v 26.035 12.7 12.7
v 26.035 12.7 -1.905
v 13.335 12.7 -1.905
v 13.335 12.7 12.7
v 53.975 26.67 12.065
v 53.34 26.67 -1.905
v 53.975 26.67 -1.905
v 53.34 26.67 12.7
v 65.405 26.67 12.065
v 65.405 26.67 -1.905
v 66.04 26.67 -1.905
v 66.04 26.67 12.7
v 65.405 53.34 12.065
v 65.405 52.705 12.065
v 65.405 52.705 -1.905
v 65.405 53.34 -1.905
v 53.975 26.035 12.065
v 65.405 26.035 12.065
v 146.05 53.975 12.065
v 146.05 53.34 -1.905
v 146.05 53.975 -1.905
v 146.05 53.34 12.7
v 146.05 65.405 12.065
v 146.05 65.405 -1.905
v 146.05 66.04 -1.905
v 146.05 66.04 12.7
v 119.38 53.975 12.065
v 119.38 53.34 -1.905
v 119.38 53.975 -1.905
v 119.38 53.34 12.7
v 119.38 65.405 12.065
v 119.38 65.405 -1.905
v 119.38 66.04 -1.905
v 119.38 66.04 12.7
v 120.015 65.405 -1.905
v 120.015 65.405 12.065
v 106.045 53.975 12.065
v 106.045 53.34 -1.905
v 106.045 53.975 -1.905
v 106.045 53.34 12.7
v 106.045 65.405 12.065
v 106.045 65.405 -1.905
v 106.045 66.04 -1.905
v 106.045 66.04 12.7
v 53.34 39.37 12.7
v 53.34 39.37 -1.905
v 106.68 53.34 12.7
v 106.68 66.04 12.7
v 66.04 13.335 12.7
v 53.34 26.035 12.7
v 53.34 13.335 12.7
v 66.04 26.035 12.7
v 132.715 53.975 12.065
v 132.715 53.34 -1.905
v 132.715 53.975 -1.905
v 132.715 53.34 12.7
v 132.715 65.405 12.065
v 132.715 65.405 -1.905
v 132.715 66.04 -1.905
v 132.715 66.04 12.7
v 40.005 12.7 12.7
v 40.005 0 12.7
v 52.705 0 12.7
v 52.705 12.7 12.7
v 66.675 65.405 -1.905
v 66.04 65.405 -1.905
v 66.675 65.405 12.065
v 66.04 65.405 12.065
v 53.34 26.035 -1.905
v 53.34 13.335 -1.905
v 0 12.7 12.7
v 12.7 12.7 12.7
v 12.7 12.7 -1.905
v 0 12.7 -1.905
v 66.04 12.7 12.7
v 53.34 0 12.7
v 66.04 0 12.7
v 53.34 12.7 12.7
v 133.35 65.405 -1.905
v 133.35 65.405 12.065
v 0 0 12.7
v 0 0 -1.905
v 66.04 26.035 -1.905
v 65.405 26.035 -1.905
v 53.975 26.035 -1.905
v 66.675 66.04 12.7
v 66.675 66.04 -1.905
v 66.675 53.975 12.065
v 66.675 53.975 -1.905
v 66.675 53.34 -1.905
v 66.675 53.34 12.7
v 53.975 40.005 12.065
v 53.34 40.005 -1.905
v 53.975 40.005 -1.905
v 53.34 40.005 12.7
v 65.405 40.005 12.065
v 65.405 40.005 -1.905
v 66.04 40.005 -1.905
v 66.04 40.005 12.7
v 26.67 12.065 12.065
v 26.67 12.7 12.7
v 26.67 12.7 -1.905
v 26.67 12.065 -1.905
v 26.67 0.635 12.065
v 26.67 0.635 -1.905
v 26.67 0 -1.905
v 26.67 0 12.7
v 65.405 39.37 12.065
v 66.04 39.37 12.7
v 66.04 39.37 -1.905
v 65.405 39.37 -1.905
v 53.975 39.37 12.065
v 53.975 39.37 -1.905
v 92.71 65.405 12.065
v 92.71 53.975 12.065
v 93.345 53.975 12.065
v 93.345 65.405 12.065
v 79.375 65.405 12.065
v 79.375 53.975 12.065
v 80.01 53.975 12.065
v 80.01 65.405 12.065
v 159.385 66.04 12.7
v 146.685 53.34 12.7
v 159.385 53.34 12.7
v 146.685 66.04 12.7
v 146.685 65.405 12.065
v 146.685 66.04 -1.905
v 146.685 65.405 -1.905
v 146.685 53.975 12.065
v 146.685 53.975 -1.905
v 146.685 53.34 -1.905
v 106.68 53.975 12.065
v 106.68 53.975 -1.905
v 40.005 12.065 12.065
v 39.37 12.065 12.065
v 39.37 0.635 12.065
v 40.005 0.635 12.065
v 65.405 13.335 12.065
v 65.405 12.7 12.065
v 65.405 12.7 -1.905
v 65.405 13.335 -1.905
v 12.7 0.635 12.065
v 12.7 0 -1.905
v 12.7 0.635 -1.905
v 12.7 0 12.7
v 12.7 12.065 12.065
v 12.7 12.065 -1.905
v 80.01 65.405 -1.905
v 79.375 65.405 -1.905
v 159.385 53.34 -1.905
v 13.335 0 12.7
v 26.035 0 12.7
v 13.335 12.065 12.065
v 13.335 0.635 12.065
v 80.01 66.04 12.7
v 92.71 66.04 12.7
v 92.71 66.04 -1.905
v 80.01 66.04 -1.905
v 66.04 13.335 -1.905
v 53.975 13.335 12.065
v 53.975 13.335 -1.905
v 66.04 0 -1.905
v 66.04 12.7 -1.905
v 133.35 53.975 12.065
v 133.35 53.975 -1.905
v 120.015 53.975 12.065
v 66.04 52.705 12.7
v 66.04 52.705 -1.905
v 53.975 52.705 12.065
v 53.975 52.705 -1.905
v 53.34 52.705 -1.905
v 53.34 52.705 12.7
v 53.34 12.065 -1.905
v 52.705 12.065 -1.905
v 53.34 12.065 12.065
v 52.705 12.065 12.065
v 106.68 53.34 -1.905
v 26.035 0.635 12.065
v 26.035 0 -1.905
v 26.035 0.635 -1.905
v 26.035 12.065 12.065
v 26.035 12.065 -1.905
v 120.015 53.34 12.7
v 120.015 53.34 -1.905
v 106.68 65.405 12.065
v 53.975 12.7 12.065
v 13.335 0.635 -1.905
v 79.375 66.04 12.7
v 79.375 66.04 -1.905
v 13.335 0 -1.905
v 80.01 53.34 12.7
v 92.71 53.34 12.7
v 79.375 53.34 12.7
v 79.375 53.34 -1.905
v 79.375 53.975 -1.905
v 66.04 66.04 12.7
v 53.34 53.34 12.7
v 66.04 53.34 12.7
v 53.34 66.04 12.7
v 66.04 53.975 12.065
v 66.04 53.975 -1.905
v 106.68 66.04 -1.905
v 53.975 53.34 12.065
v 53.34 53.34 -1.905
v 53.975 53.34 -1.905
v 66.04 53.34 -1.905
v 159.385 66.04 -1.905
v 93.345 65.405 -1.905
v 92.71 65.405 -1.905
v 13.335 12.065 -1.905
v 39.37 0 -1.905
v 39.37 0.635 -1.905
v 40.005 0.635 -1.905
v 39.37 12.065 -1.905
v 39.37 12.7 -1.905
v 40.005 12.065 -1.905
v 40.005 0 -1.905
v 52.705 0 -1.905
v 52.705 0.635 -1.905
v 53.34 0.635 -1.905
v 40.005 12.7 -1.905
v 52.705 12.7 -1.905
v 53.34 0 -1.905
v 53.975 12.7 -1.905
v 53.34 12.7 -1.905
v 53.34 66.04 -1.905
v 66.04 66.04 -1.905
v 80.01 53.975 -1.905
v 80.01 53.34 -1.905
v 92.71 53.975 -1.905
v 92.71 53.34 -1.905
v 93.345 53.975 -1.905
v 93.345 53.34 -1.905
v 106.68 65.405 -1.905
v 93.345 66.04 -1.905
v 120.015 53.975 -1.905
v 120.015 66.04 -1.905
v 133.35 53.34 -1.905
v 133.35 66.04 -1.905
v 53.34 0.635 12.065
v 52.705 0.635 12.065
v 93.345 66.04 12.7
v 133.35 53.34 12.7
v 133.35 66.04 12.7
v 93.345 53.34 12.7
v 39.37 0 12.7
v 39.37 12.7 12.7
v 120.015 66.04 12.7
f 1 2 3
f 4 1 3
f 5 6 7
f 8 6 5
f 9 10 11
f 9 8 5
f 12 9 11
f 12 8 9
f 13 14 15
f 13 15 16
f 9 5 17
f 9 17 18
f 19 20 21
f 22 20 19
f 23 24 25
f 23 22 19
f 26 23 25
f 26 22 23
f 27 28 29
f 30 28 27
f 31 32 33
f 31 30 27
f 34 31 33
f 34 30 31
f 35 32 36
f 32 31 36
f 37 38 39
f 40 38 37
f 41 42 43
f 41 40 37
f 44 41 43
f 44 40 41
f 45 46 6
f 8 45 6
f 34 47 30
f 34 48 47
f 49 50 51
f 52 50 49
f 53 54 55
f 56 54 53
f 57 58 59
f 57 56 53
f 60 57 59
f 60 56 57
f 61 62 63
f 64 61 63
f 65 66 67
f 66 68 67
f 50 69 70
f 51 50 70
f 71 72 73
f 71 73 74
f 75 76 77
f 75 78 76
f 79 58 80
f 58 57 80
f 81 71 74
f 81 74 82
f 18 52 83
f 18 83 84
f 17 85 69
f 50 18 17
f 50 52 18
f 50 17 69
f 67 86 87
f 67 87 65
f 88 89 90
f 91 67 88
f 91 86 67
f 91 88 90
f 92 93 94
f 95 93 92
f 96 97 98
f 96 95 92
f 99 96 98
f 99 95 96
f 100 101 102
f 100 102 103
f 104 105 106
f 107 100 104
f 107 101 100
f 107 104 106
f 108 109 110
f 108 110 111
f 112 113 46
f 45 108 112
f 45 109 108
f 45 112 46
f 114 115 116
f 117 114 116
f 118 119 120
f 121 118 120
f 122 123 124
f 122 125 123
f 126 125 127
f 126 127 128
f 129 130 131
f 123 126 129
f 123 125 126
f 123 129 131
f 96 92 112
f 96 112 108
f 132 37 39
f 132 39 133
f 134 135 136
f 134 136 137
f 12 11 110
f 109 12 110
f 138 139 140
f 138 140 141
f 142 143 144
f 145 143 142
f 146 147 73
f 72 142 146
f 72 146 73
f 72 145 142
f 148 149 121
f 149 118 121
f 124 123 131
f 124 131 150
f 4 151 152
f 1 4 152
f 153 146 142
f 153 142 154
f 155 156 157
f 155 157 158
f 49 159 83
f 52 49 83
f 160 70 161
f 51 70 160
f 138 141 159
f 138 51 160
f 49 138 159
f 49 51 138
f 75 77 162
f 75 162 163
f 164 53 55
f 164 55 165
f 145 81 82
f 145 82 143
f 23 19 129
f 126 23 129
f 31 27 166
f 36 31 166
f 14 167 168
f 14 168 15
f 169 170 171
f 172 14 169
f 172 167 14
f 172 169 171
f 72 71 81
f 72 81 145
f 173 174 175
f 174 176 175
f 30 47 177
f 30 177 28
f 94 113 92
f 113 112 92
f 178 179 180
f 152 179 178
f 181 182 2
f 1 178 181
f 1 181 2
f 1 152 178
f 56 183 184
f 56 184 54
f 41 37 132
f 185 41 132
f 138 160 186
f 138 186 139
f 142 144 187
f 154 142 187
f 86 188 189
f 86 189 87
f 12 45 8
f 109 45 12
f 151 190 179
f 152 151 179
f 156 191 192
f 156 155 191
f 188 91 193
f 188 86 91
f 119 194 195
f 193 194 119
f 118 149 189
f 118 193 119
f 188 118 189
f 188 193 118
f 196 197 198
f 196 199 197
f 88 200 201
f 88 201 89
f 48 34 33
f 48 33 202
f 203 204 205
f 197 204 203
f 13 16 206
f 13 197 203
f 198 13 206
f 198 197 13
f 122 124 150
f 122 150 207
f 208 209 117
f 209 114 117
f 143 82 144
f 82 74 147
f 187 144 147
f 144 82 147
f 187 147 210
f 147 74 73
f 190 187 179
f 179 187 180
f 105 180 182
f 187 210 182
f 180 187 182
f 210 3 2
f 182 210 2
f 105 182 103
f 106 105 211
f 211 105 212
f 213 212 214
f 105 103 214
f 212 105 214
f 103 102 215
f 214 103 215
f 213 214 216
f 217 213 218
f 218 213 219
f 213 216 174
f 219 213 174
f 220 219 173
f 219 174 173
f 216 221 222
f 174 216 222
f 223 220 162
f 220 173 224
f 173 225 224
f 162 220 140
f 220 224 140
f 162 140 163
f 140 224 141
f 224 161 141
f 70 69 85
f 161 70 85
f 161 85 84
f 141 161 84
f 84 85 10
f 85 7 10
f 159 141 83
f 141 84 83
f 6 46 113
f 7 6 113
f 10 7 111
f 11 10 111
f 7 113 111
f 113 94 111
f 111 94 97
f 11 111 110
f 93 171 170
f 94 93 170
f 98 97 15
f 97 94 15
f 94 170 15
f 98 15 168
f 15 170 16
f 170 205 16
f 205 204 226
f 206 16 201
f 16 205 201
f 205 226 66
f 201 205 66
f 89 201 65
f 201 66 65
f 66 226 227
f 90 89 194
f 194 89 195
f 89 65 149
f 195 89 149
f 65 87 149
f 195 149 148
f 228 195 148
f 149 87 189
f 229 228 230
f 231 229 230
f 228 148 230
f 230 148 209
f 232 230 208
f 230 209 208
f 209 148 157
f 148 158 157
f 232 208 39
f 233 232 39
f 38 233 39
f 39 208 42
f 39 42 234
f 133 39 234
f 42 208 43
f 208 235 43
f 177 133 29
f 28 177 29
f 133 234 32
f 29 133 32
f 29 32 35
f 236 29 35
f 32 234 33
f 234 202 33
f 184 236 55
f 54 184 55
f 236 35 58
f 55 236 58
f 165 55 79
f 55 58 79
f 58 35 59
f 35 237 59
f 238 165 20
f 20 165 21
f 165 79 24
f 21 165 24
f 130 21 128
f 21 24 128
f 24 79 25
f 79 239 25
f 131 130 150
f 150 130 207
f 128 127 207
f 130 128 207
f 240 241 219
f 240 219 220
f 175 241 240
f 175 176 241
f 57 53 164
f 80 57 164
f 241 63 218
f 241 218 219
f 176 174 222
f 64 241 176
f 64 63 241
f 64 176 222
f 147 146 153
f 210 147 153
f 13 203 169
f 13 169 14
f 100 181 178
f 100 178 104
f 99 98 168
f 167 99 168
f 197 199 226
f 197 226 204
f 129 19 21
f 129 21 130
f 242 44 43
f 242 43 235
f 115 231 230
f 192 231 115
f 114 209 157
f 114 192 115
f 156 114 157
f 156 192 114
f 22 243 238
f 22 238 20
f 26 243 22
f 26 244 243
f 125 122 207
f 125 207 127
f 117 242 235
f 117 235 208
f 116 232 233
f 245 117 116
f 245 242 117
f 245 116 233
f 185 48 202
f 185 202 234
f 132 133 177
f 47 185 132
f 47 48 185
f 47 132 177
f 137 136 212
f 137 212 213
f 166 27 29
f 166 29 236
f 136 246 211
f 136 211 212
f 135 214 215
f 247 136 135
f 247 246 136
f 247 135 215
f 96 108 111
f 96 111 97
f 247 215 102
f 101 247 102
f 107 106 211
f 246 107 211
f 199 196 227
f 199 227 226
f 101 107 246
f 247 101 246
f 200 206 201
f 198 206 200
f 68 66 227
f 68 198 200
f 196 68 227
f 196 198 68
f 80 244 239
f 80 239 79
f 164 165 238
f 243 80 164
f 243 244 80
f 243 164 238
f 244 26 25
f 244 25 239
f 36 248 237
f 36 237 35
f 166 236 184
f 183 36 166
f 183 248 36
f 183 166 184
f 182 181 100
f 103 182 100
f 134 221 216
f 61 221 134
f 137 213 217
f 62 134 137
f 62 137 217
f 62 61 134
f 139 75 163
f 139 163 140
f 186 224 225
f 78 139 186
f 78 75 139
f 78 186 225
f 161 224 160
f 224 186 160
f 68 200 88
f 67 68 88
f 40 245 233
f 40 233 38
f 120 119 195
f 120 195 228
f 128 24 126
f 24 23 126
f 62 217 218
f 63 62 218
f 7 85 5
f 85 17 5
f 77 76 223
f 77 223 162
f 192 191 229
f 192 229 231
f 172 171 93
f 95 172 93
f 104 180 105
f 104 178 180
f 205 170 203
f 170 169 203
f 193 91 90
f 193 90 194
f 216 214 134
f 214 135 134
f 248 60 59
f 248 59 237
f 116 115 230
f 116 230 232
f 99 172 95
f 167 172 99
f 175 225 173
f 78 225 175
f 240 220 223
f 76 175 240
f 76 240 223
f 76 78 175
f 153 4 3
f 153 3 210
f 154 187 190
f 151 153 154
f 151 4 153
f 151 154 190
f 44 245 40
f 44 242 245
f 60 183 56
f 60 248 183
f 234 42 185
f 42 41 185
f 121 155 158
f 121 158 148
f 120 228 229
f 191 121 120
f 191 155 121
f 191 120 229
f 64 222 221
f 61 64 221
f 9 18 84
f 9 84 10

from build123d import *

# Parameters (mm, degrees)
F0_W     = 1.27
F0_H     = 22.86
F1_DEPTH = 24.13
F0_H_2   = 11.43
F0_W_2   = 22.86
F0_H_3   = 1.27
F2_DEPTH = 25.4
F3_DEPTH = 3.81
F4_SCALE = 0.5


with BuildPart() as f1:
    # F0 (on Top) → F1 (new body)
    with BuildSketch(Plane.XY):
        with Locations((26.035, 12.7)):
            Rectangle(F0_W, F0_H)
    extrude(amount=F1_DEPTH)



with BuildPart() as f1b:
    # F0 (on Top) → F1, piece 2 (new body)
    with BuildSketch(Plane.XY):
        with Locations((52.705, 12.7)):
            Rectangle(F0_W, F0_H)
    extrude(amount=F1_DEPTH)


with BuildPart() as f1c:
    # F0 (on Top) → F1, piece 3 (new body)
    with BuildSketch(Plane.XY):
        with Locations((79.375, 12.7)):
            Rectangle(F0_W, F0_H)
    extrude(amount=F1_DEPTH)


with BuildPart() as f1d:
    # F0 (on Top) → F1, piece 4 (new body)
    with BuildSketch(Plane.XY):
        with Locations((106.045, 6.985)):
            Rectangle(F0_W, F0_H_2)
        with Locations((106.045, 18.415)):
            Rectangle(F0_W, F0_H_2)
    extrude(amount=F1_DEPTH)


with BuildPart() as f1e:
    # F0 (on Top) → F1, piece 5 (new body)
    with BuildSketch(Plane.XY):
        with Locations((119.38, 26.035)):
            Rectangle(F0_W_2, F0_H_3)
    extrude(amount=F1_DEPTH)


with BuildPart() as f1f:
    # F0 (on Top) → F1, piece 6 (new body)
    with BuildSketch(Plane.XY):
        with Locations((119.38, 52.705)):
            Rectangle(F0_W_2, F0_H_3)
    extrude(amount=F1_DEPTH)


with BuildPart() as f1g:
    # F0 (on Top) → F1, piece 7 (new body)
    with BuildSketch(Plane.XY):
        with Locations((119.38, 79.375)):
            Rectangle(F0_W_2, F0_H_3)
    extrude(amount=F1_DEPTH)


with BuildPart() as f1h:
    # F0 (on Top) → F1, piece 8 (new body)
    with BuildSketch(Plane.XY):
        with Locations((119.38, 106.045)):
            Rectangle(F0_W_2, F0_H_3)
    extrude(amount=F1_DEPTH)


with BuildPart() as f1i:
    # F0 (on Top) → F1, piece 9 (new body)
    with BuildSketch(Plane.XY):
        with Locations((132.715, 119.38)):
            Rectangle(F0_W, F0_H)
    extrude(amount=F1_DEPTH)


with BuildPart() as f1j:
    # F0 (on Top) → F1, piece 10 (new body)
    with BuildSketch(Plane.XY):
        with Locations((159.385, 119.38)):
            Rectangle(F0_W, F0_H)
    extrude(amount=F1_DEPTH)


with BuildPart() as f1k:
    # F0 (on Top) → F1, piece 11 (new body)
    with BuildSketch(Plane.XY):
        with Locations((186.055, 119.38)):
            Rectangle(F0_W, F0_H)
    extrude(amount=F1_DEPTH)


with BuildPart() as f1l:
    # F0 (on Top) → F1, piece 12 (new body)
    with BuildSketch(Plane.XY):
        with Locations((212.725, 119.38)):
            Rectangle(F0_W, F0_H)
    extrude(amount=F1_DEPTH)


with BuildPart() as f1m:
    # F0 (on Top) → F1, piece 13 (new body)
    with BuildSketch(Plane.XY):
        with Locations((239.395, 119.38)):
            Rectangle(F0_W, F0_H)
    extrude(amount=F1_DEPTH)


with BuildPart() as f1n:
    # F0 (on Top) → F1, piece 14 (new body)
    with BuildSketch(Plane.XY):
        with Locations((266.065, 119.38)):
            Rectangle(F0_W, F0_H)
    extrude(amount=F1_DEPTH)


with BuildPart() as f1o:
    # F0 (on Top) → F1, piece 15 (new body)
    with BuildSketch(Plane.XY):
        with Locations((292.735, 119.38)):
            Rectangle(F0_W, F0_H)
    extrude(amount=F1_DEPTH)


with BuildPart() as f1_1:
    add(f1.part)

    add(f1b.part)  # F2 merges F1b

    add(f1c.part)  # F2 merges F1c

    add(f1d.part)  # F2 merges F1d

    add(f1e.part)  # F2 merges F1e

    add(f1f.part)  # F2 merges F1f

    add(f1g.part)  # F2 merges F1g

    add(f1h.part)  # F2 merges F1h

    add(f1i.part)  # F2 merges F1i

    add(f1j.part)  # F2 merges F1j

    add(f1k.part)  # F2 merges F1k

    add(f1l.part)  # F2 merges F1l

    add(f1m.part)  # F2 merges F1m

    add(f1n.part)  # F2 merges F1n

    add(f1o.part)  # F2 merges F1o
    # F0 (on Top) → F2 (join)
    with BuildSketch(Plane.XY):
        Polygon((0, 25.4), (0, 0), (25.4, 0), (25.4, 1.27), (25.4, 24.13), (25.4, 25.4), align=None)
        Polygon((26.67, 24.13), (26.67, 1.27), (26.67, 0), (52.07, 0), (52.07, 1.27), (52.07, 24.13), (52.07, 25.4), (26.67, 25.4), align=None)
        Polygon((53.34, 24.13), (53.34, 1.27), (53.34, 0), (78.74, 0), (78.74, 1.27), (78.74, 24.13), (78.74, 25.4), (53.34, 25.4), align=None)
        Polygon((80.01, 24.13), (80.01, 1.27), (80.01, 0), (105.41, 0), (105.41, 1.27), (105.41, 12.7), (105.41, 24.13), (105.41, 25.4), (80.01, 25.4), align=None)
        Polygon((106.68, 12.7), (106.68, 1.27), (106.68, 0), (132.08, 0), (132.08, 25.4), (130.81, 25.4), (107.95, 25.4), (106.68, 25.4), (106.68, 24.13), align=None)
        Polygon((106.68, 26.67), (107.95, 26.67), (130.81, 26.67), (132.08, 26.67), (132.08, 52.07), (130.81, 52.07), (107.95, 52.07), (106.68, 52.07), align=None)
        Polygon((106.68, 53.34), (107.95, 53.34), (130.81, 53.34), (132.08, 53.34), (132.08, 78.74), (130.81, 78.74), (107.95, 78.74), (106.68, 78.74), align=None)
        Polygon((106.68, 80.01), (107.95, 80.01), (130.81, 80.01), (132.08, 80.01), (132.08, 105.41), (130.81, 105.41), (107.95, 105.41), (106.68, 105.41), align=None)
        Polygon((106.68, 106.68), (107.95, 106.68), (130.81, 106.68), (132.08, 106.68), (132.08, 107.95), (132.08, 130.81), (132.08, 132.08), (106.68, 132.08), align=None)
        Polygon((133.35, 130.81), (133.35, 107.95), (133.35, 106.68), (158.75, 106.68), (158.75, 107.95), (158.75, 130.81), (158.75, 132.08), (133.35, 132.08), align=None)
        Polygon((160.02, 130.81), (160.02, 107.95), (160.02, 106.68), (185.42, 106.68), (185.42, 107.95), (185.42, 130.81), (185.42, 132.08), (160.02, 132.08), align=None)
        Polygon((186.69, 130.81), (186.69, 107.95), (186.69, 106.68), (212.09, 106.68), (212.09, 107.95), (212.09, 130.81), (212.09, 132.08), (186.69, 132.08), align=None)
        Polygon((213.36, 130.81), (213.36, 107.95), (213.36, 106.68), (238.76, 106.68), (238.76, 107.95), (238.76, 130.81), (238.76, 132.08), (213.36, 132.08), align=None)
        Polygon((240.03, 130.81), (240.03, 107.95), (240.03, 106.68), (265.43, 106.68), (265.43, 107.95), (265.43, 130.81), (265.43, 132.08), (240.03, 132.08), align=None)
        Polygon((266.7, 130.81), (266.7, 107.95), (266.7, 106.68), (292.1, 106.68), (292.1, 107.95), (292.1, 130.81), (292.1, 132.08), (266.7, 132.08), align=None)
        Polygon((293.37, 130.81), (293.37, 107.95), (293.37, 106.68), (318.77, 106.68), (318.77, 107.95), (318.77, 130.81), (318.77, 132.08), (293.37, 132.08), align=None)
    extrude(amount=F2_DEPTH)

    # F0 (on Top) → F3 (join)
    with BuildSketch(Plane.XY):
        Polygon((53.34, 24.13), (53.34, 1.27), (53.34, 0), (78.74, 0), (78.74, 1.27), (78.74, 24.13), (78.74, 25.4), (53.34, 25.4), align=None)
        Polygon((213.36, 130.81), (213.36, 107.95), (213.36, 106.68), (238.76, 106.68), (238.76, 107.95), (238.76, 130.81), (238.76, 132.08), (213.36, 132.08), align=None)
        Polygon((106.68, 106.68), (107.95, 106.68), (130.81, 106.68), (132.08, 106.68), (132.08, 107.95), (132.08, 130.81), (132.08, 132.08), (106.68, 132.08), align=None)
        Polygon((0, 25.4), (0, 0), (25.4, 0), (25.4, 1.27), (25.4, 24.13), (25.4, 25.4), align=None)
        Polygon((293.37, 130.81), (293.37, 107.95), (293.37, 106.68), (318.77, 106.68), (318.77, 107.95), (318.77, 130.81), (318.77, 132.08), (293.37, 132.08), align=None)
        Polygon((106.68, 80.01), (107.95, 80.01), (130.81, 80.01), (132.08, 80.01), (132.08, 105.41), (130.81, 105.41), (107.95, 105.41), (106.68, 105.41), align=None)
        Polygon((106.68, 53.34), (107.95, 53.34), (130.81, 53.34), (132.08, 53.34), (132.08, 78.74), (130.81, 78.74), (107.95, 78.74), (106.68, 78.74), align=None)
        Polygon((106.68, 26.67), (107.95, 26.67), (130.81, 26.67), (132.08, 26.67), (132.08, 52.07), (130.81, 52.07), (107.95, 52.07), (106.68, 52.07), align=None)
        Polygon((26.67, 24.13), (26.67, 1.27), (26.67, 0), (52.07, 0), (52.07, 1.27), (52.07, 24.13), (52.07, 25.4), (26.67, 25.4), align=None)
        Polygon((160.02, 130.81), (160.02, 107.95), (160.02, 106.68), (185.42, 106.68), (185.42, 107.95), (185.42, 130.81), (185.42, 132.08), (160.02, 132.08), align=None)
        Polygon((186.69, 130.81), (186.69, 107.95), (186.69, 106.68), (212.09, 106.68), (212.09, 107.95), (212.09, 130.81), (212.09, 132.08), (186.69, 132.08), align=None)
        Polygon((240.03, 130.81), (240.03, 107.95), (240.03, 106.68), (265.43, 106.68), (265.43, 107.95), (265.43, 130.81), (265.43, 132.08), (240.03, 132.08), align=None)
        Polygon((106.68, 12.7), (106.68, 1.27), (106.68, 0), (132.08, 0), (132.08, 25.4), (130.81, 25.4), (107.95, 25.4), (106.68, 25.4), (106.68, 24.13), align=None)
        Polygon((133.35, 130.81), (133.35, 107.95), (133.35, 106.68), (158.75, 106.68), (158.75, 107.95), (158.75, 130.81), (158.75, 132.08), (133.35, 132.08), align=None)
        Polygon((80.01, 24.13), (80.01, 1.27), (80.01, 0), (105.41, 0), (105.41, 1.27), (105.41, 12.7), (105.41, 24.13), (105.41, 25.4), (80.01, 25.4), align=None)
        Polygon((266.7, 130.81), (266.7, 107.95), (266.7, 106.68), (292.1, 106.68), (292.1, 107.95), (292.1, 130.81), (292.1, 132.08), (266.7, 132.08), align=None)
        with Locations((132.715, 119.38)):
            Rectangle(F0_W, F0_H)
        with Locations((119.38, 106.045)):
            Rectangle(F0_W_2, F0_H_3)
        with Locations((239.395, 119.38)):
            Rectangle(F0_W, F0_H)
        with Locations((186.055, 119.38)):
            Rectangle(F0_W, F0_H)
        with Locations((159.385, 119.38)):
            Rectangle(F0_W, F0_H)
        with Locations((52.705, 12.7)):
            Rectangle(F0_W, F0_H)
        with Locations((212.725, 119.38)):
            Rectangle(F0_W, F0_H)
        with Locations((119.38, 79.375)):
            Rectangle(F0_W_2, F0_H_3)
        with Locations((119.38, 52.705)):
            Rectangle(F0_W_2, F0_H_3)
        with Locations((119.38, 26.035)):
            Rectangle(F0_W_2, F0_H_3)
        with Locations((79.375, 12.7)):
            Rectangle(F0_W, F0_H)
        with Locations((26.035, 12.7)):
            Rectangle(F0_W, F0_H)
        with Locations((266.065, 119.38)):
            Rectangle(F0_W, F0_H)
        with Locations((106.045, 6.985)):
            Rectangle(F0_W, F0_H_2)
        with Locations((292.735, 119.38)):
            Rectangle(F0_W, F0_H)
        with Locations((106.045, 18.415)):
            Rectangle(F0_W, F0_H_2)
    extrude(amount=-F3_DEPTH)


with BuildPart() as f1_2:
    # F4: moved
    add(f1_1.part.scale(F4_SCALE))


solid = f1_2.part
